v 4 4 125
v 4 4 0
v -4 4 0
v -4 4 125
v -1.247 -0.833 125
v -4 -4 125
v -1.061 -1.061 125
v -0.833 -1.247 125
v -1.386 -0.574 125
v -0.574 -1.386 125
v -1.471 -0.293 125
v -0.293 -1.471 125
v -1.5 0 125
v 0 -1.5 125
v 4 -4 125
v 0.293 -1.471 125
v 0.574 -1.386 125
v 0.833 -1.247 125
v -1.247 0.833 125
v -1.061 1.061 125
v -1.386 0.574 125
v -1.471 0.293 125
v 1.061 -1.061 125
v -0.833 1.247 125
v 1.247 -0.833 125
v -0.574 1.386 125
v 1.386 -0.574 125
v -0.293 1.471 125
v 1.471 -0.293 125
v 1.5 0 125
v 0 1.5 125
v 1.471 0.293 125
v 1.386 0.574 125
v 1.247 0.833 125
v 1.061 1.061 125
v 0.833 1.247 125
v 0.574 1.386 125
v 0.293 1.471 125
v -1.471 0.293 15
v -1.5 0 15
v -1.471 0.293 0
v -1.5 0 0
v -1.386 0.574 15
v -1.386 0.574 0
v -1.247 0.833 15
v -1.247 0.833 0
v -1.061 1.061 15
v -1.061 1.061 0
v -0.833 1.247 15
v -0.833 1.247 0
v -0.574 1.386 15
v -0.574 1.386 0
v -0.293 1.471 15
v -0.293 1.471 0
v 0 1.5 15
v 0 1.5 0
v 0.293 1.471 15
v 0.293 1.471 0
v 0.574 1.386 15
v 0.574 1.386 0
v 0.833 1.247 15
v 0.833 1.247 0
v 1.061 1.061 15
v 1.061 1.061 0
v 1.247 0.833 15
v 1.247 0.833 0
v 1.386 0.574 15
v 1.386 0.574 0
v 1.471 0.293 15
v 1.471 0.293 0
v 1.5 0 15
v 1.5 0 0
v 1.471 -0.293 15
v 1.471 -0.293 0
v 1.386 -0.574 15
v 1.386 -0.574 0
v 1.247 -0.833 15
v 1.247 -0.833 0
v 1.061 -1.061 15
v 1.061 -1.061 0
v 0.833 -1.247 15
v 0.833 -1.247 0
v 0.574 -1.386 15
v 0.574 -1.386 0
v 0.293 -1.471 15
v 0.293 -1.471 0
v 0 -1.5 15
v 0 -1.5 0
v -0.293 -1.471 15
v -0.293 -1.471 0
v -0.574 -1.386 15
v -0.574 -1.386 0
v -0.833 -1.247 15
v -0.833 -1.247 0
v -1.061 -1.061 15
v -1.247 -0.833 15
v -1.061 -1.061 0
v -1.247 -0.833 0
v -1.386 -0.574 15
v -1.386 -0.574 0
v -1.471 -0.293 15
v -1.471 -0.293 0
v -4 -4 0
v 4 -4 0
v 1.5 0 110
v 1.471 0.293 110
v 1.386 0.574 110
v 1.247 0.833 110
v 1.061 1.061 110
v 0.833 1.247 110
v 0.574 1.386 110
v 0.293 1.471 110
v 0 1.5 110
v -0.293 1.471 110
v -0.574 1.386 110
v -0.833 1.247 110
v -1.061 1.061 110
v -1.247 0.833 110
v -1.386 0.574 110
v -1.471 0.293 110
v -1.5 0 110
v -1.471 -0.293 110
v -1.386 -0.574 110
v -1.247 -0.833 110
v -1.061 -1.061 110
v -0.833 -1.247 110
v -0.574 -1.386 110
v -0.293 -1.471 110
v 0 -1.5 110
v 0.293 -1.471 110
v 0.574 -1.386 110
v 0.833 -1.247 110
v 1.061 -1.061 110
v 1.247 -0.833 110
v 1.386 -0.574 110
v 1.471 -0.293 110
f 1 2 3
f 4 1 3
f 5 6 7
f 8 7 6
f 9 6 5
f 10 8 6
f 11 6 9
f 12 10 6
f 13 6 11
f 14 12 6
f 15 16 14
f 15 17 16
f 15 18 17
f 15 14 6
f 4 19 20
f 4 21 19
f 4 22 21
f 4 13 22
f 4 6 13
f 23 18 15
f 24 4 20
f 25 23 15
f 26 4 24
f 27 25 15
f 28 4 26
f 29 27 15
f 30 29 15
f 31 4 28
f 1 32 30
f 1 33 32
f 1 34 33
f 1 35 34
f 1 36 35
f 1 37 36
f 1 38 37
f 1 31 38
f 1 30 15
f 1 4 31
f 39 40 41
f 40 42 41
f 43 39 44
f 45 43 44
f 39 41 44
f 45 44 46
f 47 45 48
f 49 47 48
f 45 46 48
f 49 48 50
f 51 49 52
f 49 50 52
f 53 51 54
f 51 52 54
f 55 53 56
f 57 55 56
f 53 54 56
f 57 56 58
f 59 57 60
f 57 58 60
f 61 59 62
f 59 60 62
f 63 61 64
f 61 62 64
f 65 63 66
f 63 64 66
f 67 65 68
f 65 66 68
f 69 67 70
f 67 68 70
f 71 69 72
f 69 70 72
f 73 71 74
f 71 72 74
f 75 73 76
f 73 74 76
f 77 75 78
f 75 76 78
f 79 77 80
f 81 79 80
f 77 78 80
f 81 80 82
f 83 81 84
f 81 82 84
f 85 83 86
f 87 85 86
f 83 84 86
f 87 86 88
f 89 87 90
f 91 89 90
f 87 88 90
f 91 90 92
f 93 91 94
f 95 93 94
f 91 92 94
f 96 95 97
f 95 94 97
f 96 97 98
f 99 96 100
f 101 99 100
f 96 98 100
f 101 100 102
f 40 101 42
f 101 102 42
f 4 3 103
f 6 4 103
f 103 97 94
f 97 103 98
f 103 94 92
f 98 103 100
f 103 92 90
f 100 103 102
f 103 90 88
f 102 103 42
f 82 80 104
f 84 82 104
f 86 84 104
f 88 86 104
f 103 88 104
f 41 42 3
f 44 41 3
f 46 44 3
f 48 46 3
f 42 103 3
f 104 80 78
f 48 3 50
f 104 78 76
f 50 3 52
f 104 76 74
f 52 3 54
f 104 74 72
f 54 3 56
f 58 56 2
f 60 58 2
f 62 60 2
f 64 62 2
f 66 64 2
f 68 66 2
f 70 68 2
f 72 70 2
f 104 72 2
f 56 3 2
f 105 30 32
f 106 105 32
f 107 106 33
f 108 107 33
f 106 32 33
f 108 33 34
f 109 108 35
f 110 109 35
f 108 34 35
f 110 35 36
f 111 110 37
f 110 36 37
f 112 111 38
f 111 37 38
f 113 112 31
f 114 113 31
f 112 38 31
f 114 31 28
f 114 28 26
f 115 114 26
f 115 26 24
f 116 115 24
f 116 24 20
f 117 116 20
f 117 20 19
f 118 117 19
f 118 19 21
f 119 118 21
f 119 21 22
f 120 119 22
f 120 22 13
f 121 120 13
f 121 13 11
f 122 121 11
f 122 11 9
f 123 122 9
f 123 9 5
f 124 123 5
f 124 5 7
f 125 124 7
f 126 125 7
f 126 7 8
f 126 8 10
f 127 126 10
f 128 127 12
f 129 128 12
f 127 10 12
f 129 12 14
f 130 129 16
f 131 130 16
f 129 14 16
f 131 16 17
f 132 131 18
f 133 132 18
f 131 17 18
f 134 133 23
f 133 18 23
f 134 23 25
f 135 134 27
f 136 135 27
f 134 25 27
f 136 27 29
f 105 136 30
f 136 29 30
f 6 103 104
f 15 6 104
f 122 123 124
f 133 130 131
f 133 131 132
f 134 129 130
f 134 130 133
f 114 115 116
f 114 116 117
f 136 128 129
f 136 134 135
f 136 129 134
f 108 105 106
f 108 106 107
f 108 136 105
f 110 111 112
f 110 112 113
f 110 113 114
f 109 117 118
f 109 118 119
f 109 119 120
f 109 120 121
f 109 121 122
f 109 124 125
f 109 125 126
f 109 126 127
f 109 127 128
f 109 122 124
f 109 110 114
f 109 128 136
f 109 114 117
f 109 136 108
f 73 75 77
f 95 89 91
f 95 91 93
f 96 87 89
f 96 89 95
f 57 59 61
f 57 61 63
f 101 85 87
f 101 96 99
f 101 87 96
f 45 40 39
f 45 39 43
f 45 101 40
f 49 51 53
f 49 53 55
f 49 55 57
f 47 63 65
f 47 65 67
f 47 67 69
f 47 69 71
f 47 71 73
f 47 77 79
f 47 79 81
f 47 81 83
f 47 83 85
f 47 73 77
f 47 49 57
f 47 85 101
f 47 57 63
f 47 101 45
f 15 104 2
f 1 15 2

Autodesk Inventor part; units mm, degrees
ref_plane "YZ Plane" through (0, 0, 0) normal (1, 0, 0) x (0, 1, 0)
ref_plane "XZ Plane" through (0, 0, 0) normal (0, 1, 0) x (-1, 0, 0)
ref_plane "XY Plane" through (0, 0, 0) normal (0, 0, 1) x (1, 0, 0)
sketch "Sketch1" plane through (0, 0, 0) normal (0, 0, 1) x (1, 0, 0)
  line L0 (4, 4) -> (-4, 4)
  line L1 (-4, 4) -> (-4, -4)
  line L2 (-4, -4) -> (4, -4)
  line L3 (4, -4) -> (4, 4)
  line L4 (4, 4) -> (-4, -4) construction
  line L5 (-4, 4) -> (4, -4) construction
  point P0 (0, 0)
  dimension "d0" = 8
  dimension "d1" = 8
extrude "Extrusion1" add sketch "Sketch1" along normal blind 125
sketch "Sketch2" plane through (0, 0, 125) normal (0, 0, 1) x (1, 0, 0)
  circle A0 centre (0, 0) radius 1.5
  dimension "d4" = 3
extrude "Extrusion2" cut sketch "Sketch2" against normal blind 15
sketch "Sketch4" plane through (0, 0, 0) normal (0, 0, -1) x (-1, 0, 0)
  circle A0 centre (0, 0) radius 1.5 projected
  circle A1 centre (0, 0) radius 1.5
  dimension "d11" = 3
extrude "Extrusion4" cut sketch "Sketch4" against normal blind 15
properties part number "bacaklar"
